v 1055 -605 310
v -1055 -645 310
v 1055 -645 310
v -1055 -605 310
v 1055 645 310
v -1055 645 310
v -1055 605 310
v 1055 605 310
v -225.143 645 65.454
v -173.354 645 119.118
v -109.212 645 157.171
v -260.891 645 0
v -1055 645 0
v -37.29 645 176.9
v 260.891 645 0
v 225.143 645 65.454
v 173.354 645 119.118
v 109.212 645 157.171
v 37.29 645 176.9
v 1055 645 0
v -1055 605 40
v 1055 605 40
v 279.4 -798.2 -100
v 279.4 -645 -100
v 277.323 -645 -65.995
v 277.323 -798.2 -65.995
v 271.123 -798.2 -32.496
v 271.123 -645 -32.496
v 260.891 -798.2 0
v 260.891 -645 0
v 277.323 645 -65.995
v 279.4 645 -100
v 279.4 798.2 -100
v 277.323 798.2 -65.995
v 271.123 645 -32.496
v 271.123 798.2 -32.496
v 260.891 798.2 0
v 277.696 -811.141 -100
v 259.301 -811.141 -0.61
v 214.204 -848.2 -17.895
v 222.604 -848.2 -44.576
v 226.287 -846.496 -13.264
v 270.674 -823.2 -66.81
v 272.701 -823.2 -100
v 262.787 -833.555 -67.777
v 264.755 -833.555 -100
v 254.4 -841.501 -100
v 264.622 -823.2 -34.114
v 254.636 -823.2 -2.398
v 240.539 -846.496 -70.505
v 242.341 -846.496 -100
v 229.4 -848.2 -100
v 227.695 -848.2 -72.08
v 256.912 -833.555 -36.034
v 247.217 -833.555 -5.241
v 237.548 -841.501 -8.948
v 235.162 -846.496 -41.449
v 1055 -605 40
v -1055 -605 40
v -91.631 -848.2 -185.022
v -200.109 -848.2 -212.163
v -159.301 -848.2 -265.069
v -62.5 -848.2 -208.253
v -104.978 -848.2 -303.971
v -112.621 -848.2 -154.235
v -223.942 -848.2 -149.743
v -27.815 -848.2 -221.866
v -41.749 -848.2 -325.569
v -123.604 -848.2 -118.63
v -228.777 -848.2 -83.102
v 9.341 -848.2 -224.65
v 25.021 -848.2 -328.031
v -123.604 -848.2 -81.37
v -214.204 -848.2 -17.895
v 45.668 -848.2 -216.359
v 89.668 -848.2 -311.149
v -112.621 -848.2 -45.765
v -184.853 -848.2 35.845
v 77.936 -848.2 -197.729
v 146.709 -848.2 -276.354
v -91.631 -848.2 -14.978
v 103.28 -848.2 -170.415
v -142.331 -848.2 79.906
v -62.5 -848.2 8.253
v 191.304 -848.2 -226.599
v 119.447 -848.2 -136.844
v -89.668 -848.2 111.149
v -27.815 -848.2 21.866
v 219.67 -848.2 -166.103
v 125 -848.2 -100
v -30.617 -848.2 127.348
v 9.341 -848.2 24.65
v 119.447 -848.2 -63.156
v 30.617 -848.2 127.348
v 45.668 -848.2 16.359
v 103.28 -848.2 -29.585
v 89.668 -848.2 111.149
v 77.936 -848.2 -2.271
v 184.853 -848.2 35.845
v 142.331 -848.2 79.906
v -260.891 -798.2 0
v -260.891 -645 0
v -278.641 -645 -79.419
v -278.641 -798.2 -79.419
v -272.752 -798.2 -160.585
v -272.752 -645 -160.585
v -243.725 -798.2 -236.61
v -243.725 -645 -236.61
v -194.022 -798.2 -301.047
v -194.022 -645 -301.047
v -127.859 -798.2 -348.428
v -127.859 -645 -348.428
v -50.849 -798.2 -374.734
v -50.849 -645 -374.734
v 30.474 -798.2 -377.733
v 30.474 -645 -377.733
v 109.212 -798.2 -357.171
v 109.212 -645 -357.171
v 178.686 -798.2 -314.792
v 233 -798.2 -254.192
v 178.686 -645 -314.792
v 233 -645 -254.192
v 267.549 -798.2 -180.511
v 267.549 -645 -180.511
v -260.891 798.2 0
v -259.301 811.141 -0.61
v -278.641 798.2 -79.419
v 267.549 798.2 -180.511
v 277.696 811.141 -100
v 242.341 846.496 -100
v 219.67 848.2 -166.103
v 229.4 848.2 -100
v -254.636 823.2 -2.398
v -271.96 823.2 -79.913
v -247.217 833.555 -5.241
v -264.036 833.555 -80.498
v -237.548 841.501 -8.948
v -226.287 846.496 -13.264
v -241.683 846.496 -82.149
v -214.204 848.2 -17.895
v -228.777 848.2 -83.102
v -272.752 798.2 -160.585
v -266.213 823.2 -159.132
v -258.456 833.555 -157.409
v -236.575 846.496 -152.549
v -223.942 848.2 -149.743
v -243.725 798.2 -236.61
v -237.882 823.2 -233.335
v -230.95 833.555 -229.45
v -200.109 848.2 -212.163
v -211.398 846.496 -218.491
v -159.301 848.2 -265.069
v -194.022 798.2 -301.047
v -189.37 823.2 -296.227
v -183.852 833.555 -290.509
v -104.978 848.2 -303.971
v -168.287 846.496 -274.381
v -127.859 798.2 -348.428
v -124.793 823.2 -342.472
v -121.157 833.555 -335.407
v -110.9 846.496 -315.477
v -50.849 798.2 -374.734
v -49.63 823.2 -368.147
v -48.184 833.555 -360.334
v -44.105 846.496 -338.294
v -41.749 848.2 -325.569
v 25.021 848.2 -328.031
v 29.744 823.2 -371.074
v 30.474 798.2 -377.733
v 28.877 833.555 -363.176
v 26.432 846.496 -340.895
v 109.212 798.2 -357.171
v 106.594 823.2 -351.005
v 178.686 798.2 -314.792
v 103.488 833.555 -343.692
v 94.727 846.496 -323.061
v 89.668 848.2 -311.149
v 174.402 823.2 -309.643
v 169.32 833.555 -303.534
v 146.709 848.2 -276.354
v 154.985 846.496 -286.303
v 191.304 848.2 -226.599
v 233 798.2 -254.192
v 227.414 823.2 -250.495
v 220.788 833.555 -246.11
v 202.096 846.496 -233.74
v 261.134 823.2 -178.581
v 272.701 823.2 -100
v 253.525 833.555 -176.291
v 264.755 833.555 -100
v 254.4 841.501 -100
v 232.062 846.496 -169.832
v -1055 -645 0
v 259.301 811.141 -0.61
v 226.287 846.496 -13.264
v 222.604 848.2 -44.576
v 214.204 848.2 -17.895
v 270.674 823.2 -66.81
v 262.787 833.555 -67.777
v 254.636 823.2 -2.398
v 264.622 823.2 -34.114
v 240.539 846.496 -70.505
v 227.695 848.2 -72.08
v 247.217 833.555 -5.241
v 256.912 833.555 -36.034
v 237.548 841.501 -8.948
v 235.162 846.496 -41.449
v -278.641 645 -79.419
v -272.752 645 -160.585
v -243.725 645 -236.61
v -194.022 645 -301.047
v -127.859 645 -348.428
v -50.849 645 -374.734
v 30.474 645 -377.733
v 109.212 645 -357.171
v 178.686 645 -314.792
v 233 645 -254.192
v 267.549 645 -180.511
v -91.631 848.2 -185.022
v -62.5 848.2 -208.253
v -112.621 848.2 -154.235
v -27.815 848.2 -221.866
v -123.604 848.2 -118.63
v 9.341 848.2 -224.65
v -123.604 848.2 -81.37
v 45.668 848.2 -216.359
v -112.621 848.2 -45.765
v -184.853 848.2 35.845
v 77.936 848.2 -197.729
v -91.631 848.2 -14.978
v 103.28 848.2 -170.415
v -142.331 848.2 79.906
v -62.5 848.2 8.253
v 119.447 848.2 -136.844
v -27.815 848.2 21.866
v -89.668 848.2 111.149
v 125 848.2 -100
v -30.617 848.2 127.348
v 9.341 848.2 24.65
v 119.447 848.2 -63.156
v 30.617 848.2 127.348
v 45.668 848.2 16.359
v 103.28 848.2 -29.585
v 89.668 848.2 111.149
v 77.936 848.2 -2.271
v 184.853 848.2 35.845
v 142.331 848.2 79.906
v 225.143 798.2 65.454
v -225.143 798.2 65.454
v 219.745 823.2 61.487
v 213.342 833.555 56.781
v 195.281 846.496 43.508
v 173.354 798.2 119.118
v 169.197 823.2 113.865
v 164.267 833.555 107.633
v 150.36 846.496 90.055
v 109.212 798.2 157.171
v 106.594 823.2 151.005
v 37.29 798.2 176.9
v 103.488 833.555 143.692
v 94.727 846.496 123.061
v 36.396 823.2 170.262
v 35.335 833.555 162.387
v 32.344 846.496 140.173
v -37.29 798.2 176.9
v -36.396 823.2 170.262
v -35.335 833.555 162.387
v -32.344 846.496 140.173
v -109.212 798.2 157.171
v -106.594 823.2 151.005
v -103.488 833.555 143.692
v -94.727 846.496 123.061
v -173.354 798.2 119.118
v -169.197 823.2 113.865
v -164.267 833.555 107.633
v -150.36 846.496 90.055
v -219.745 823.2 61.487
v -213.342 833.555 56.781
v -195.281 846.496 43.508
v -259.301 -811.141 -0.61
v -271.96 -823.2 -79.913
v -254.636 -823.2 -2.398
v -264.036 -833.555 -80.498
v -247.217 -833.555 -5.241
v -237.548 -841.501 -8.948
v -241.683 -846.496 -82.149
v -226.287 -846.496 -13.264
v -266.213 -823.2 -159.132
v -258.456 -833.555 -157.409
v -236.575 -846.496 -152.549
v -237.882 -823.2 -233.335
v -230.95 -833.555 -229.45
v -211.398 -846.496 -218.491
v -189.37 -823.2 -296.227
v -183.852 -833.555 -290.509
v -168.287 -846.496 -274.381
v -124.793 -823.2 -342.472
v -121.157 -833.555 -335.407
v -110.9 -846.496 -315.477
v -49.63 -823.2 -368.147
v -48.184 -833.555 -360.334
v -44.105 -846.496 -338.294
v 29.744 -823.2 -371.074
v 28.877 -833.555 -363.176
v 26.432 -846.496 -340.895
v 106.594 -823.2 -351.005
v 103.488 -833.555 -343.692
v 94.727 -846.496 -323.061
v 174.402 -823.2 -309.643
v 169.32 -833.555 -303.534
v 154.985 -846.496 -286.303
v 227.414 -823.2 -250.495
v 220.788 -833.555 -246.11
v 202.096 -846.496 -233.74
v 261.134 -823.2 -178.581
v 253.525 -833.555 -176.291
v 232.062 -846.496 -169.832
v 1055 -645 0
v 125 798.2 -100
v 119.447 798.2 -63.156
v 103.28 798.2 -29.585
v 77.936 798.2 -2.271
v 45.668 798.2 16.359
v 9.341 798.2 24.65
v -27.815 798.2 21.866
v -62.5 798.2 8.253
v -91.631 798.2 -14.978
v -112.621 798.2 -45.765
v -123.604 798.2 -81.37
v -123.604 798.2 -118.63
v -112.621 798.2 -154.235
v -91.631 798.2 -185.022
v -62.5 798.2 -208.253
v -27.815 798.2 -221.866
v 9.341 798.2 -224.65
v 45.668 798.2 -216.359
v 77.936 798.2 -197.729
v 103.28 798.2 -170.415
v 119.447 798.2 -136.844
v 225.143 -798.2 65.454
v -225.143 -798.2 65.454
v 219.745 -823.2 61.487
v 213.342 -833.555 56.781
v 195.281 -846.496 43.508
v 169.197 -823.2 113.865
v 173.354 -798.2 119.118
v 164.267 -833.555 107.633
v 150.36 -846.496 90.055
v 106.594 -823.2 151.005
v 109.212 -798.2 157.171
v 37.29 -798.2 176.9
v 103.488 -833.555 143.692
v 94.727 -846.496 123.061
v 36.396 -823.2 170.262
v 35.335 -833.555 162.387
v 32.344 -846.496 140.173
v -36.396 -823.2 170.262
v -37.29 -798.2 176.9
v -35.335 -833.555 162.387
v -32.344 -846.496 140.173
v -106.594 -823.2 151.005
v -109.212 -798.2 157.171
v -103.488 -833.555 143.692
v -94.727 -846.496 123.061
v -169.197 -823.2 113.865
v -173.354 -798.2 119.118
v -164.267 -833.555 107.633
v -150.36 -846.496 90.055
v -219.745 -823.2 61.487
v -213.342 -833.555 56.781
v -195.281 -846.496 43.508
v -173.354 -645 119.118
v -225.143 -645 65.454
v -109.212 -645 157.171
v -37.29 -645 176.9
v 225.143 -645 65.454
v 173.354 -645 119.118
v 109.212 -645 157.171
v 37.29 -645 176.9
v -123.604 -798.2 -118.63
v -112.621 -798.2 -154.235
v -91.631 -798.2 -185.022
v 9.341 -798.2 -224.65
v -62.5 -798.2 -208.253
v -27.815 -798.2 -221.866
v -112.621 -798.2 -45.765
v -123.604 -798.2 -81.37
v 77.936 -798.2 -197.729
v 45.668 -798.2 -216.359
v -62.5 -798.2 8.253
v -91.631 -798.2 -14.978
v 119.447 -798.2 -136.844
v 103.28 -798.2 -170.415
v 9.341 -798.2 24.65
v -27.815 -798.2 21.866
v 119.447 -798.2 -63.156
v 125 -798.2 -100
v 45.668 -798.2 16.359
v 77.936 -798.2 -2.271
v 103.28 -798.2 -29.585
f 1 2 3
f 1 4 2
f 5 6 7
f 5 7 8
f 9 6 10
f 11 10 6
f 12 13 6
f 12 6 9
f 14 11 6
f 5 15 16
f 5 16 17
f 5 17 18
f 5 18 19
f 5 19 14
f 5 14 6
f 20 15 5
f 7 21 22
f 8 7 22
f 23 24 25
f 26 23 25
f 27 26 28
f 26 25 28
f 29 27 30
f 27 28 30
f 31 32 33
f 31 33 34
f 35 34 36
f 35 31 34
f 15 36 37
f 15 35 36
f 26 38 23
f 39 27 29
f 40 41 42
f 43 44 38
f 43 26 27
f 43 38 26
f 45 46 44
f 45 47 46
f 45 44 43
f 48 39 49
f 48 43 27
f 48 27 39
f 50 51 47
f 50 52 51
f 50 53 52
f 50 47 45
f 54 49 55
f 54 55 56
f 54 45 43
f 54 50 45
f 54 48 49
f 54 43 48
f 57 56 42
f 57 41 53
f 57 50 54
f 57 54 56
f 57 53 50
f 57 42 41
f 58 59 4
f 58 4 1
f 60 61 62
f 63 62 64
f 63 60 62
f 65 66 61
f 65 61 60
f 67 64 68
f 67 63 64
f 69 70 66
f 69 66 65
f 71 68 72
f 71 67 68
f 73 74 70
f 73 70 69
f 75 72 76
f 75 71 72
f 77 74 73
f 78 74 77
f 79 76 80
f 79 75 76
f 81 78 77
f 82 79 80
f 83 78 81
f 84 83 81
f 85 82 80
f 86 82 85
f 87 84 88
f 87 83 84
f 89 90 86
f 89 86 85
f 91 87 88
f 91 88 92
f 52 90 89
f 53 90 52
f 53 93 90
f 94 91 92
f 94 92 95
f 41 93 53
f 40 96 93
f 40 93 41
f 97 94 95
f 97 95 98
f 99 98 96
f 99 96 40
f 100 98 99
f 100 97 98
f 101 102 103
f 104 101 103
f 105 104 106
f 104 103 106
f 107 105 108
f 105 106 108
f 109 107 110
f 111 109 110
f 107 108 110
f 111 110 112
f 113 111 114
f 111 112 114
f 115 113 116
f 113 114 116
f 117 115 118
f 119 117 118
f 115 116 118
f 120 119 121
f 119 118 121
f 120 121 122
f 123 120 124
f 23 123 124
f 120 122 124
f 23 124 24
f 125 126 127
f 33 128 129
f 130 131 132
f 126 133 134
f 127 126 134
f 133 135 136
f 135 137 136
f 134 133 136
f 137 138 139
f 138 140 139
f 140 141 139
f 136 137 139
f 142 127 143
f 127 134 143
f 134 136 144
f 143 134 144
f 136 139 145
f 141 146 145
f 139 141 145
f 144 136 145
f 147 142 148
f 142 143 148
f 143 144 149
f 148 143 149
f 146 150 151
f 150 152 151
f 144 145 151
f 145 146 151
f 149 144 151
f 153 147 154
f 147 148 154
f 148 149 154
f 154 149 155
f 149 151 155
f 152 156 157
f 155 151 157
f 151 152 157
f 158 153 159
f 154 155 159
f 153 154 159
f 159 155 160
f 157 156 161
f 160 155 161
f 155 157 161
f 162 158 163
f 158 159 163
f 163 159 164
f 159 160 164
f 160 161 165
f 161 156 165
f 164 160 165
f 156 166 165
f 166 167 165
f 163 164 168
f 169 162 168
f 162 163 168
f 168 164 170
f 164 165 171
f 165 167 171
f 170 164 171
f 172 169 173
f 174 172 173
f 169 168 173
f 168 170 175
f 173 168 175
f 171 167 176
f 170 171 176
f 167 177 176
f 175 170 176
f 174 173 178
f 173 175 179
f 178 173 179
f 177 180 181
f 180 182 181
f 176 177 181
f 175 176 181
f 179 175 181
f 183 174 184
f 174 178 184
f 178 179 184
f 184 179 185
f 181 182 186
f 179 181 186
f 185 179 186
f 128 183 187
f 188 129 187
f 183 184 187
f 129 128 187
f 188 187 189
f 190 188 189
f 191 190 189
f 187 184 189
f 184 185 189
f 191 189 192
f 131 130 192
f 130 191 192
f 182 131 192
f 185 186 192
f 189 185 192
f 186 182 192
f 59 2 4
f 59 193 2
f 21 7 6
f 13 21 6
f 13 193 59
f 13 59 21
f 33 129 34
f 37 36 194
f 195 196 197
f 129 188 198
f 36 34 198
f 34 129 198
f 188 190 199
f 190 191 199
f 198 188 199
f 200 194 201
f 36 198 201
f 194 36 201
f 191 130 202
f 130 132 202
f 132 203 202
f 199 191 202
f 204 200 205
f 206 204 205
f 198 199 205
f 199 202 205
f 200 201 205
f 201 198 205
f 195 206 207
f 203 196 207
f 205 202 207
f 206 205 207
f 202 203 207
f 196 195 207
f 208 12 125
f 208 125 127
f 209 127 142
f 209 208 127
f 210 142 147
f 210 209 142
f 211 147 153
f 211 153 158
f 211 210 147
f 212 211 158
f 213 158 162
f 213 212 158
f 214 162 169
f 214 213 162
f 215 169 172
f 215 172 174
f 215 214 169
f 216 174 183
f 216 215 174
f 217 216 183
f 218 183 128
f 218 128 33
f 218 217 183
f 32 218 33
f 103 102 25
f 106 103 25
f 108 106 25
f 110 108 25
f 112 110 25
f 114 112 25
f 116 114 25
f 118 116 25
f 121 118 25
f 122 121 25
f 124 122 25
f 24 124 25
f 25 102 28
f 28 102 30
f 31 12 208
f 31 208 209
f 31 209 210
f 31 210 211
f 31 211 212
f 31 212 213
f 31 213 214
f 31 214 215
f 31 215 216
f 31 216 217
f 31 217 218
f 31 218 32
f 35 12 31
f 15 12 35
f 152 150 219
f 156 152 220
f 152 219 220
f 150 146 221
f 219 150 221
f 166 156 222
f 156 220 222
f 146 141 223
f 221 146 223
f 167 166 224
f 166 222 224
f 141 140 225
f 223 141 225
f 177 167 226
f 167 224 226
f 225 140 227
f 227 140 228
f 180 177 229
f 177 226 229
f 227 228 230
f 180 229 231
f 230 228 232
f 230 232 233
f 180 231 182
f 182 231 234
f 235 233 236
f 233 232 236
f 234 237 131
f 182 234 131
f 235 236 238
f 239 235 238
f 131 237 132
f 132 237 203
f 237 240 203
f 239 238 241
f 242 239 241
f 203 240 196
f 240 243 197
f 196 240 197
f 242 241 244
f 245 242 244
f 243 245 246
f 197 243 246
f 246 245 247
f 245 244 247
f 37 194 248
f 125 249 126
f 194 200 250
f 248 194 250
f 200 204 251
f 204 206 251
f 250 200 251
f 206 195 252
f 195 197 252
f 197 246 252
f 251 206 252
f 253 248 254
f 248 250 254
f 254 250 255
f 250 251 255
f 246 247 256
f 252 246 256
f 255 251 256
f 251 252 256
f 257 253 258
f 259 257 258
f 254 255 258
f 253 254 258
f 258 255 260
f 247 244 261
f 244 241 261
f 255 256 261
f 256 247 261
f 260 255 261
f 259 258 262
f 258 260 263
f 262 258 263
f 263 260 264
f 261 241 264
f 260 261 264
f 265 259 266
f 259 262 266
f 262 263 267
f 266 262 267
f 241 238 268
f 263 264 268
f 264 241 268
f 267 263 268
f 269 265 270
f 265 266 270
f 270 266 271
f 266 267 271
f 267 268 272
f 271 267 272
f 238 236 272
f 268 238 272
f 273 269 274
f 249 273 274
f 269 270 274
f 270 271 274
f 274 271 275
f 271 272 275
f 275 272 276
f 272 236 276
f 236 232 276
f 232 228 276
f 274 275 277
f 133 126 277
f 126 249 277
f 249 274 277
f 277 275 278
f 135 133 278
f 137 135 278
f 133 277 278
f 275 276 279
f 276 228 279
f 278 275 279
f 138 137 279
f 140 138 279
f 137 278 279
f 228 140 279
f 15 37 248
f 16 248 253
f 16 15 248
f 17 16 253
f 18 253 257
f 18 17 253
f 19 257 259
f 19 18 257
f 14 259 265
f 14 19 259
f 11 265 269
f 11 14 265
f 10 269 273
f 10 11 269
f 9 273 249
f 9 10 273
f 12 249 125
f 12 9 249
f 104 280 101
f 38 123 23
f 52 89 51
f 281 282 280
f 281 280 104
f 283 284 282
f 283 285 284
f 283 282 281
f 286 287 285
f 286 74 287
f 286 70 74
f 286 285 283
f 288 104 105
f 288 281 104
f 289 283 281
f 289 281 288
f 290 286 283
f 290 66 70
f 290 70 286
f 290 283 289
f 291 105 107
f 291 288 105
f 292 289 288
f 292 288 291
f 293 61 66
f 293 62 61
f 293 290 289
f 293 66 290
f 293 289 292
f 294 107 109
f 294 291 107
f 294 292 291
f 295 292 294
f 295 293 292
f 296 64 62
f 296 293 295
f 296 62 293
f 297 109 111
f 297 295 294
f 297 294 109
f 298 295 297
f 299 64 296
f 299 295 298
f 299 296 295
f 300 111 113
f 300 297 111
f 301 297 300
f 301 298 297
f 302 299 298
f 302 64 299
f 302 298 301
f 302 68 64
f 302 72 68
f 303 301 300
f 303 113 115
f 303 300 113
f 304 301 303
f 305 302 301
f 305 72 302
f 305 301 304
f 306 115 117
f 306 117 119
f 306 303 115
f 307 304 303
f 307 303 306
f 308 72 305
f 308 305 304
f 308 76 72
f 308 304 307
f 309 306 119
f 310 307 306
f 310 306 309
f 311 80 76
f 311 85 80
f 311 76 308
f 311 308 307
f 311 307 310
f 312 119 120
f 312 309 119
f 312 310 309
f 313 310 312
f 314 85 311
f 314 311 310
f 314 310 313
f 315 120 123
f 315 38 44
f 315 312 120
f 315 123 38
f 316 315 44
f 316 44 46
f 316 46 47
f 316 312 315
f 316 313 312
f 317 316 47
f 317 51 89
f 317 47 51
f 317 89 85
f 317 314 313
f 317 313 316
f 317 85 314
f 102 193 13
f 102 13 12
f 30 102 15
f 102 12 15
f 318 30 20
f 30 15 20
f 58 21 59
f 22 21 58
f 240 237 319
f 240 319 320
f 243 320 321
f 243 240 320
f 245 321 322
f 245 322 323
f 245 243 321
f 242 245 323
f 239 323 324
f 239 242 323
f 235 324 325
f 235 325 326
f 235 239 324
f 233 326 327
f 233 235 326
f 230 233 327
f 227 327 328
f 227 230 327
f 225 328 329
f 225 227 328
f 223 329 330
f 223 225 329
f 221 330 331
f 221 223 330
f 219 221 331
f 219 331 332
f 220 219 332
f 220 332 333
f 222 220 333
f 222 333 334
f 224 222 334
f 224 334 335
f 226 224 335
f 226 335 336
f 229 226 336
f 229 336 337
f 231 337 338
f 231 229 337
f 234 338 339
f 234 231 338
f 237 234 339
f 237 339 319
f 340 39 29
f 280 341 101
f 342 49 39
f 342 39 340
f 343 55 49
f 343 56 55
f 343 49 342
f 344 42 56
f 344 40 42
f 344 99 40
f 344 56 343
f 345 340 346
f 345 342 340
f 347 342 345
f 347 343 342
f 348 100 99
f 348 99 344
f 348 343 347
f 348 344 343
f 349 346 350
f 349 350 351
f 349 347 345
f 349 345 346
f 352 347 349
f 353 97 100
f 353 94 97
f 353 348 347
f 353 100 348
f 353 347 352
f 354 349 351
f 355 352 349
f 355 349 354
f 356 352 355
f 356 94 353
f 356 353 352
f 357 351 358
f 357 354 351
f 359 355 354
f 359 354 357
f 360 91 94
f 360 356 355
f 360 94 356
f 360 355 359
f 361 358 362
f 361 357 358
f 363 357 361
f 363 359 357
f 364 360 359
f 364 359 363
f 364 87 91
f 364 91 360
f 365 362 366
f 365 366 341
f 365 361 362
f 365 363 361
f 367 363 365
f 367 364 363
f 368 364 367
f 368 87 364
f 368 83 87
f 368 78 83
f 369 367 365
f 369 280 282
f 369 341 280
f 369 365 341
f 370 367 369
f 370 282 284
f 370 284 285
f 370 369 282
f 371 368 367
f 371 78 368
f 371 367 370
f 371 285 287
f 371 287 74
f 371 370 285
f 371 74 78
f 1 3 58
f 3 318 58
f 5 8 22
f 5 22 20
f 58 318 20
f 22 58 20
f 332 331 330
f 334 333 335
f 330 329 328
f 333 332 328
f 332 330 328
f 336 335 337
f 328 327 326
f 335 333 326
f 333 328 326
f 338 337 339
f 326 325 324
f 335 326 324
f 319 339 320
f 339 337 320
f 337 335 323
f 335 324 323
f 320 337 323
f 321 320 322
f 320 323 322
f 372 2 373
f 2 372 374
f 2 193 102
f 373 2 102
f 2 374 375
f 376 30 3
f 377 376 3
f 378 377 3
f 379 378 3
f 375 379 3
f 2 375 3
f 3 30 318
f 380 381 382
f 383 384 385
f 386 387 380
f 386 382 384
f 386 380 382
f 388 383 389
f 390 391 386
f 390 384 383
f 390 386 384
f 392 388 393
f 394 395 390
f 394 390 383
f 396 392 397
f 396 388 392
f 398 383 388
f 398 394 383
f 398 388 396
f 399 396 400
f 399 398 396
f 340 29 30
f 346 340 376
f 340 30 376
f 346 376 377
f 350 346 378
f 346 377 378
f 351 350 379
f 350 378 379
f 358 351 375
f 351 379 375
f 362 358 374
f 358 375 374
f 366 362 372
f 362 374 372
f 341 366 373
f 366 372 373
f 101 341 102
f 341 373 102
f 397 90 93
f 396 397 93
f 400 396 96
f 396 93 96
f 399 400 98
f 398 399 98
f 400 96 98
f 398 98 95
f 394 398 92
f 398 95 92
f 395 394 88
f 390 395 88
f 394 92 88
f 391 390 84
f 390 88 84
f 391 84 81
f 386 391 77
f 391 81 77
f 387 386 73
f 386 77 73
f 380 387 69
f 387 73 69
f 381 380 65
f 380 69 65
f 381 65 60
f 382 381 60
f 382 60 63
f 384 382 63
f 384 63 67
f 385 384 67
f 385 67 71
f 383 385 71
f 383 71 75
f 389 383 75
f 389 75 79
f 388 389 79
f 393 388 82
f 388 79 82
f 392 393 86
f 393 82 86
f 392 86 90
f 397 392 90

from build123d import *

# Parameters (mm, degrees)
F0_W     = 2110
F0_H     = 1290
F1_DEPTH = 310
F2_T     = -40
F4_DEPTH = 203.2
F5_R     = 50
F6_R     = 125
F7_DEPTH = 50


with BuildPart() as f1:
    # F0 (on Top) → F1 (new body)
    with BuildSketch(Plane.XY):
        Rectangle(F0_W, F0_H)
    extrude(amount=F1_DEPTH)

    # F2
    f2_openings = [f1.faces().sort_by_distance(p)[0] for p in [
        (1055, 0, 155),
        (0, 0, 310),
        (-1055, 0, 155),
    ]]
    offset(amount=F2_T, openings=f2_openings)

    # F3 (on face) → F4 (join)
    with BuildSketch(Plane.XZ.offset(645)):
        with BuildLine():
            Line((-260.891472, 0), (260.891472, 0))
            ThreePointArc((260.891472, 0), (0, 179.4), (-260.891472, 0))
        make_face()
        with BuildLine():
            ThreePointArc((-260.891472, 0), (-50.849203, -374.733905), (279.4, -100))
            ThreePointArc((279.4, -100), (274.733905, -49.150797), (260.891472, 0))
            Line((260.891472, 0), (-260.891472, 0))
        make_face()
    extrude(amount=F4_DEPTH)

    # F5
    f5_edges = [f1.edges().sort_by_distance(p)[0] for p in [
        (-279.4, -848.2, -100),
    ]]
    fillet(f5_edges, radius=F5_R)

    # F6 (on face) → F7 (cut)
    with BuildSketch(Plane.XZ.offset(848.2)):
        with Locations((0, -100)):
            Circle(F6_R)
    extrude(amount=-F7_DEPTH, mode=Mode.SUBTRACT)

    # F8: F1 across plane


with BuildPart() as f1_1:
    add(f1.part)
    add(f1.part.mirror(Plane.XZ))


solid = f1_1.part
